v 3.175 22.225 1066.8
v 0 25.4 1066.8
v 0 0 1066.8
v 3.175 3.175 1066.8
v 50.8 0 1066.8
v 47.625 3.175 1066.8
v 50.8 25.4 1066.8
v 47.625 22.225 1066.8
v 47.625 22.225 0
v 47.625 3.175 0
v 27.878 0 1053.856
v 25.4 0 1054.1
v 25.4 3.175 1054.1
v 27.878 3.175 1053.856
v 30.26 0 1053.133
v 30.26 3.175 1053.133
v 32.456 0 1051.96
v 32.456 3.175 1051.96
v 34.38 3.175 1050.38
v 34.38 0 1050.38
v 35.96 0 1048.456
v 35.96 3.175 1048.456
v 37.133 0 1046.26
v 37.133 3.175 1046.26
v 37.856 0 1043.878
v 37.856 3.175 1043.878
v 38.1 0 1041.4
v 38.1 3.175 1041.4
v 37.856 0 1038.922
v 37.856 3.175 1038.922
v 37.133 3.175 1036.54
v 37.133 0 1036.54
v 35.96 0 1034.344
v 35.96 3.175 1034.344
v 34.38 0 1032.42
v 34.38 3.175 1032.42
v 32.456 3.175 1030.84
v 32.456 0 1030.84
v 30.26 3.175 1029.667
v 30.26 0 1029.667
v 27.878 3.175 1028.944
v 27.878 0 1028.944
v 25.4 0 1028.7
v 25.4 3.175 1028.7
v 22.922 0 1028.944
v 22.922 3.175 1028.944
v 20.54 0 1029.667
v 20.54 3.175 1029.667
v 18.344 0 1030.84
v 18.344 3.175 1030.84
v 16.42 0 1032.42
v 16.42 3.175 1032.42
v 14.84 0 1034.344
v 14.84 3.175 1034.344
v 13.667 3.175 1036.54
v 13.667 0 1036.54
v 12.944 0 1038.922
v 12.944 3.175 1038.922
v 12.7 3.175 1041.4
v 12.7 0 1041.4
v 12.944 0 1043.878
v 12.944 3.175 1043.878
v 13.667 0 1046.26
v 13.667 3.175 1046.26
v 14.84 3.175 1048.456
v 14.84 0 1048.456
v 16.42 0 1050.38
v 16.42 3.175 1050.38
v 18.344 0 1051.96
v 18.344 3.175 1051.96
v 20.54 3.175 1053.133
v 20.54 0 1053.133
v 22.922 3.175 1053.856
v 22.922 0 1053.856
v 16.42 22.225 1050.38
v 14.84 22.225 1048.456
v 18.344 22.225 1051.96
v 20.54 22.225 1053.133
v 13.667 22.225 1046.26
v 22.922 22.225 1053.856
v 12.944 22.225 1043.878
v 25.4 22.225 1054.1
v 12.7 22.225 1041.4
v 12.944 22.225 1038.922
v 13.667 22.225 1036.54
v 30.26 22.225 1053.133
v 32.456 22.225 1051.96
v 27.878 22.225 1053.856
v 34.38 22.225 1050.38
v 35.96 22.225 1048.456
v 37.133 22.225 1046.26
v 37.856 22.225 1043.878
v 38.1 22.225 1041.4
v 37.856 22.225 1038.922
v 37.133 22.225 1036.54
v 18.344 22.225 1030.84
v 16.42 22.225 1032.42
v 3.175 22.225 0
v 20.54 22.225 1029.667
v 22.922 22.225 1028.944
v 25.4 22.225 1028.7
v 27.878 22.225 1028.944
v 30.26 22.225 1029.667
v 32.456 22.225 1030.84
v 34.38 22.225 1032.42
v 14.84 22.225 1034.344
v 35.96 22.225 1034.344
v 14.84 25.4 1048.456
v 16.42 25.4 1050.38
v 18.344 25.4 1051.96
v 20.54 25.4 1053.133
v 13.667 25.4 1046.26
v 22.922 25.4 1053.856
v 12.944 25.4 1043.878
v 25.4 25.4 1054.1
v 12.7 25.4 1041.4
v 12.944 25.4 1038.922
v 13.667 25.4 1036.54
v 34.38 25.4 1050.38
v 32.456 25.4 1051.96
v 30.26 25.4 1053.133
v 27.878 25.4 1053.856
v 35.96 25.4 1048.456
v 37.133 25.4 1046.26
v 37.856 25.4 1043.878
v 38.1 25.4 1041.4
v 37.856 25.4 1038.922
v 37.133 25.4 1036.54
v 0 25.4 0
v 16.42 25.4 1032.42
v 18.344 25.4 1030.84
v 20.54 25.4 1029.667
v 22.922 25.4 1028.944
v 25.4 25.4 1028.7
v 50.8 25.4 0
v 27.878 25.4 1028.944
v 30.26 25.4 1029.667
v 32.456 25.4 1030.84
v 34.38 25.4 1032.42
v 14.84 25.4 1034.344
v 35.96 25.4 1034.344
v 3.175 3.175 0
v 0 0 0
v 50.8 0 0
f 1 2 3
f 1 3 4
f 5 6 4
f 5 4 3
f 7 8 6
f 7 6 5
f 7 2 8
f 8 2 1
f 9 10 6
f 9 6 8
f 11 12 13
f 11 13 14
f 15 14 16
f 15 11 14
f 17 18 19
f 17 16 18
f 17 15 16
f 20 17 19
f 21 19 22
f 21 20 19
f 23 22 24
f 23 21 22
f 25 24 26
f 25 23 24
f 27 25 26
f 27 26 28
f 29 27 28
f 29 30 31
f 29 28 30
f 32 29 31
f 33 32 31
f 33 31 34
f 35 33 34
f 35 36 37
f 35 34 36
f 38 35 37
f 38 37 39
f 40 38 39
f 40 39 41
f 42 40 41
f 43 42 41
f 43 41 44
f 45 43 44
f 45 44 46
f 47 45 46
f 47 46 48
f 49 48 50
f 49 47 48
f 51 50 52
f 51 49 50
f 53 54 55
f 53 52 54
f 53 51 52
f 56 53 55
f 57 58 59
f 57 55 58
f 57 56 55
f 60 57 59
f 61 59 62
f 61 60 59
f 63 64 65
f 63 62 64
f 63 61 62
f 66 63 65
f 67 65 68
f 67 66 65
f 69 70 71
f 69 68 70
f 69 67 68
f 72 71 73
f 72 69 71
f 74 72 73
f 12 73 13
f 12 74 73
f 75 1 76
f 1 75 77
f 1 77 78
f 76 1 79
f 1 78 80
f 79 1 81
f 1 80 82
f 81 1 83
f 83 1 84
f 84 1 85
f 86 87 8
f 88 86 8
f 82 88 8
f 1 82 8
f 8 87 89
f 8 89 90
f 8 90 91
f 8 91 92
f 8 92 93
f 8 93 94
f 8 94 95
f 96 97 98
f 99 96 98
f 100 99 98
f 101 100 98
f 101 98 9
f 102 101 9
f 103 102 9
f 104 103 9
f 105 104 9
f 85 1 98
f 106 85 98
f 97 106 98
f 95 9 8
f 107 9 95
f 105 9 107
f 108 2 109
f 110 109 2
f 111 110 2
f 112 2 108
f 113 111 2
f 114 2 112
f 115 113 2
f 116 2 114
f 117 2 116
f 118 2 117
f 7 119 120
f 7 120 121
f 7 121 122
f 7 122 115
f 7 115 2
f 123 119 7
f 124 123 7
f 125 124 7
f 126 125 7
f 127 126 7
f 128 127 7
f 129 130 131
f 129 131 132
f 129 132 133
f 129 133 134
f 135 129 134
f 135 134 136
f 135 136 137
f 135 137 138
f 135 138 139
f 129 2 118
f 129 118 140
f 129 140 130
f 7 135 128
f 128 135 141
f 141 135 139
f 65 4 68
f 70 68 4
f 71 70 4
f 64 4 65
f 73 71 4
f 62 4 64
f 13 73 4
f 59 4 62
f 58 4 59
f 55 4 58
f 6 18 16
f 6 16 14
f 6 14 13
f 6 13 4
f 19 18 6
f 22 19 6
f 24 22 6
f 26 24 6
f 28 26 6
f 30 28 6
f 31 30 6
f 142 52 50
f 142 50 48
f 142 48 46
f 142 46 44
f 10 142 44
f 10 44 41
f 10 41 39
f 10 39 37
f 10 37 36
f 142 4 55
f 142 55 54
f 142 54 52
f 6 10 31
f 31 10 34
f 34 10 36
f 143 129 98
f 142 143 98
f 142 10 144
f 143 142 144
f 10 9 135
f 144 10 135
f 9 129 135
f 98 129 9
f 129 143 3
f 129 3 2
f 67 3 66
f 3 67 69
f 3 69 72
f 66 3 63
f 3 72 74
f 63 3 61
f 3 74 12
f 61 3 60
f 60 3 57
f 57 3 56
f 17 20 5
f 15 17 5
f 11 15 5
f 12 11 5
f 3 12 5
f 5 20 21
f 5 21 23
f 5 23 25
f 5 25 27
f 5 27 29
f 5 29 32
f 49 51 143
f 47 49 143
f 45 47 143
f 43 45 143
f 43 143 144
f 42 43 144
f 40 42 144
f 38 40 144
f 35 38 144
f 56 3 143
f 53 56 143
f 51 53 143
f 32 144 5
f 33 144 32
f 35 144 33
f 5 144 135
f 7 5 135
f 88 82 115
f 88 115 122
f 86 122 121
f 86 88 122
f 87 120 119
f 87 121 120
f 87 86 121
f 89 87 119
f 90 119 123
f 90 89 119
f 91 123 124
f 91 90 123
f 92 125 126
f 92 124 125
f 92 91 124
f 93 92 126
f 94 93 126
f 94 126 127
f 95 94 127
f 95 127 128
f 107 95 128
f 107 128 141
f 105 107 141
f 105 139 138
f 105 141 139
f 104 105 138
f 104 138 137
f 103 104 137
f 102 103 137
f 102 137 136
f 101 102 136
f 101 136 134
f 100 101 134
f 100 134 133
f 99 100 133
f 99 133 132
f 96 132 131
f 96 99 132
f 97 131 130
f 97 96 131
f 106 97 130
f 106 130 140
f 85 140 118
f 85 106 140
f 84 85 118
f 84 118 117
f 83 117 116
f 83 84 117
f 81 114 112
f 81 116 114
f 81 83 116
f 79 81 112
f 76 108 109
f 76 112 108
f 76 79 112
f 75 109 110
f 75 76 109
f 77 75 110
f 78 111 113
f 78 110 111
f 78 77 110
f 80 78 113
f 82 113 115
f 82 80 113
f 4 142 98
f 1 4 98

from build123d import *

# Parameters (mm, degrees)
SKETCH1_W               = 50.8
SKETCH1_H               = 25.4
BOSS_EXTRUDE2_DEPTH     = 1066.8
CUT_EXTRUDE2_DEPTH      = 1069.310834917
CUT_EXTRUDE2_DEPTH_BACK = 1069.310834917
SKETCH3_W               = 44.45
SKETCH3_H               = 19.05
CUT_EXTRUDE3_DEPTH      = 1069.310834917
CUT_EXTRUDE3_DEPTH_BACK = 1069.310834917
SKETCH4_R               = 12.7


with BuildPart() as part:
    # Sketch1 → Boss-Extrude2 (new body)
    with BuildSketch(Plane.XY):
        with Locations((25.4, 12.7)):
            Rectangle(SKETCH1_W, SKETCH1_H)
    extrude(amount=BOSS_EXTRUDE2_DEPTH)

    # Sketch3 → Cut-Extrude2 (cut, two sides: drawn at the far end of the back side and taken through both)
    with BuildSketch(Plane.XY.offset(1066.8).offset(-CUT_EXTRUDE2_DEPTH_BACK)):
        with Locations((25.4, 12.7)):
            Rectangle(SKETCH3_W, SKETCH3_H)
    extrude(amount=CUT_EXTRUDE2_DEPTH + CUT_EXTRUDE2_DEPTH_BACK, mode=Mode.SUBTRACT)

    # Sketch4 → Cut-Extrude3 (cut, two sides: drawn at the far end of the back side and taken through both)
    with BuildSketch(Plane(origin=(0, 25.4, 0), x_dir=(1, 0, 0), z_dir=(0, 1, 0)).offset(-CUT_EXTRUDE3_DEPTH_BACK)):
        with Locations(Location((25.4, -1041.4, 0), (0, 0, 270))):
            Circle(SKETCH4_R)
    extrude(amount=CUT_EXTRUDE3_DEPTH + CUT_EXTRUDE3_DEPTH_BACK, mode=Mode.SUBTRACT)


solid = part.part
